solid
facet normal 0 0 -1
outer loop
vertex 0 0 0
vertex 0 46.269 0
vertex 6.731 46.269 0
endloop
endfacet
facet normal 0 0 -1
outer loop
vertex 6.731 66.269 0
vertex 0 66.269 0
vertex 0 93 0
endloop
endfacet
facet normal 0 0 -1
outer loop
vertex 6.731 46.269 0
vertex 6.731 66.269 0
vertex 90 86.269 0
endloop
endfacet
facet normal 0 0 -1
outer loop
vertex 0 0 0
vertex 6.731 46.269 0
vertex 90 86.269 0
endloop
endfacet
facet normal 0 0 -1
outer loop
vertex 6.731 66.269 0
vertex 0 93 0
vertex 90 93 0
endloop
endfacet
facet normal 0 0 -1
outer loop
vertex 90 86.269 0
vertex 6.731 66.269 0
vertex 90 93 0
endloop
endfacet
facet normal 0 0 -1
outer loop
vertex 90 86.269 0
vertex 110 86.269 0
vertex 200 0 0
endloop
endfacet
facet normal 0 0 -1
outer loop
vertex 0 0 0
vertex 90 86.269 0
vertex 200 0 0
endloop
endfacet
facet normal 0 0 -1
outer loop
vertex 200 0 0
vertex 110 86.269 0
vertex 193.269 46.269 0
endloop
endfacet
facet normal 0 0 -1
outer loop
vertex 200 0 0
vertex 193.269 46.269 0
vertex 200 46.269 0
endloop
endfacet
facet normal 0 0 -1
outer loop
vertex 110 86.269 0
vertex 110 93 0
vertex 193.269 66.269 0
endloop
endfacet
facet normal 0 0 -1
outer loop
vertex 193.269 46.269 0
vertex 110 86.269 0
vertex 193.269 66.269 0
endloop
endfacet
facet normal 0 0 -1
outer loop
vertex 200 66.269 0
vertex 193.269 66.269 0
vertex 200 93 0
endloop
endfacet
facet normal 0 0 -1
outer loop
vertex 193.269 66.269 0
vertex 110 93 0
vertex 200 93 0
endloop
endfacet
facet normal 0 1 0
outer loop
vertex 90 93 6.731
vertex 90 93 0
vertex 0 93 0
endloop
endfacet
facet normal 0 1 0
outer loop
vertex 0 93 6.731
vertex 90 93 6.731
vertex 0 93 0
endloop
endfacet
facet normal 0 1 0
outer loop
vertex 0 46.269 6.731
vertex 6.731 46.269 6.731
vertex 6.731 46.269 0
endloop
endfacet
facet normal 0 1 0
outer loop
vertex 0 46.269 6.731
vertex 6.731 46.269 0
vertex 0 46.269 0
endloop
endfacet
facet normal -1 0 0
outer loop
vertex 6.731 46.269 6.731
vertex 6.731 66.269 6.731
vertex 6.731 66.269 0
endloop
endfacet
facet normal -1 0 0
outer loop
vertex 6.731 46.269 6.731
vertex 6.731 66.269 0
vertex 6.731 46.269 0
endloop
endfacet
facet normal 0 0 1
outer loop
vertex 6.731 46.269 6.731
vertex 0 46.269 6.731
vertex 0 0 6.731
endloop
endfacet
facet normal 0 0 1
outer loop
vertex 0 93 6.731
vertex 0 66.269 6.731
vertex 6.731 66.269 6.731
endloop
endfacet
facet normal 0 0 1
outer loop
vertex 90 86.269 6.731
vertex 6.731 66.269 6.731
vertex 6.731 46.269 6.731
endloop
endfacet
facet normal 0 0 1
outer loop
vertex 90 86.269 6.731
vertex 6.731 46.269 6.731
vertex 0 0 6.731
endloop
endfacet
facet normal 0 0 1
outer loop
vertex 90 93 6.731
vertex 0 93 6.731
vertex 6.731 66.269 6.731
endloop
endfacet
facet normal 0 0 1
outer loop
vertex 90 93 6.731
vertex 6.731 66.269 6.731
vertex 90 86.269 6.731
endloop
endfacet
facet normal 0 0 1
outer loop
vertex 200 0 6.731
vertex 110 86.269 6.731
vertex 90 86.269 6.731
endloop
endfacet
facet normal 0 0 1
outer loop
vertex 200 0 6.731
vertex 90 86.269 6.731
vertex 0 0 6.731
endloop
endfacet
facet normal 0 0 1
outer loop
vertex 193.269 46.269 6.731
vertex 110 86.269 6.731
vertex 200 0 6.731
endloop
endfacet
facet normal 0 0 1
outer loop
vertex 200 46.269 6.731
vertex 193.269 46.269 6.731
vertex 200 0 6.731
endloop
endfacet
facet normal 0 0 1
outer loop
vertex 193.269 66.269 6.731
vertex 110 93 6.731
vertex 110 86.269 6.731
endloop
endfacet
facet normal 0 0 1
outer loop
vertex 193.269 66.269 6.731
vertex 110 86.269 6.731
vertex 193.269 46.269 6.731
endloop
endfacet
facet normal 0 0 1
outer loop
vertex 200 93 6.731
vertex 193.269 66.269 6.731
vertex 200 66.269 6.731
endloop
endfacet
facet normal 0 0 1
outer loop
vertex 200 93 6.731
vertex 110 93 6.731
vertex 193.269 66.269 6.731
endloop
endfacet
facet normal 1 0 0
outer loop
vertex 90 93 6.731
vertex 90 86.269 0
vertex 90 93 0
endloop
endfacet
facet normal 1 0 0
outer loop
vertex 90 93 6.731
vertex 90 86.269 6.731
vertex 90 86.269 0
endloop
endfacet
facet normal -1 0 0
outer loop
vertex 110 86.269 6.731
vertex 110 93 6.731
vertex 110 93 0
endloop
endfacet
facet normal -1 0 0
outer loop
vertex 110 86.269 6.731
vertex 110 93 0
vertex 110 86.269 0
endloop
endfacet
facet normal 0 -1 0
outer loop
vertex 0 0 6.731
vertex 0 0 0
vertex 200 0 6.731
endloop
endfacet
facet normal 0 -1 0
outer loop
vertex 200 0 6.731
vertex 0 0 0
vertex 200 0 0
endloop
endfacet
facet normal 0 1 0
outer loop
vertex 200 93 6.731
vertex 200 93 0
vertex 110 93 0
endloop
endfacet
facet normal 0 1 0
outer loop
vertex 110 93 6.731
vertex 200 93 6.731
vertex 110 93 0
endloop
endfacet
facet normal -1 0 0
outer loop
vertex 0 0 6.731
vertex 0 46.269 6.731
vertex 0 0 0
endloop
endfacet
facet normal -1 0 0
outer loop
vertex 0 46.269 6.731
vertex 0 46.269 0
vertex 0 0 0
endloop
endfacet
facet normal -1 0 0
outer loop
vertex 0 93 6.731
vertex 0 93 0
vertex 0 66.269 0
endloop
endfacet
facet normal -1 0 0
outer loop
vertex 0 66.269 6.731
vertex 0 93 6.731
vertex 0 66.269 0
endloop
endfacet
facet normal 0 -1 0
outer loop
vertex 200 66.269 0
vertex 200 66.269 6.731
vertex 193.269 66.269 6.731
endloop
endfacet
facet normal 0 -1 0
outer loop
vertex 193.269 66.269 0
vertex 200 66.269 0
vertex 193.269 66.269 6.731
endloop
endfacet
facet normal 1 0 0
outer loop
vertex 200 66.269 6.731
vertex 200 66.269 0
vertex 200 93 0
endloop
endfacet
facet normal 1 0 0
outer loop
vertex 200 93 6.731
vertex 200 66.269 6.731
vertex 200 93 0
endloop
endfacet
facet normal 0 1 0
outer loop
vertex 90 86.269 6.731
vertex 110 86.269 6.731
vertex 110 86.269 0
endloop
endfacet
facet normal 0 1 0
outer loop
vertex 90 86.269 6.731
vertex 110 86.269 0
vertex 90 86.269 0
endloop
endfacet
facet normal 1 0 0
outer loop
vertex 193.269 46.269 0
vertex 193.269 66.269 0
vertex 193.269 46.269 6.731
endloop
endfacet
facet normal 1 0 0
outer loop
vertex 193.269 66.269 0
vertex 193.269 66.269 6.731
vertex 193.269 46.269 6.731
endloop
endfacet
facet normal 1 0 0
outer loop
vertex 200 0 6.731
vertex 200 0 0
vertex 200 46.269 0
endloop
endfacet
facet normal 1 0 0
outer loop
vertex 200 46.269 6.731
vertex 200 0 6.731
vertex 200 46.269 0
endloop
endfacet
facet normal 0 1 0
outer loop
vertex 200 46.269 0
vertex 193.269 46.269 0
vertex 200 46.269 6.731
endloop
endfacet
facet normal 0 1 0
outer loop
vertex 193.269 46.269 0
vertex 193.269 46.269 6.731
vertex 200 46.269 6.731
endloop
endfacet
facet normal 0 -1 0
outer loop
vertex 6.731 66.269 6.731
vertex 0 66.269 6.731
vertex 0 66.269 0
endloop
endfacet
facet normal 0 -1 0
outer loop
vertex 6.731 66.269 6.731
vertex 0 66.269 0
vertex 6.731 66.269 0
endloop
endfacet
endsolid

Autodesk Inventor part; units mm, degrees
ref_plane "YZ Plane" through (0, 0, 0) normal (1, 0, 0) x (0, 1, 0)
ref_plane "XZ Plane" through (0, 0, 0) normal (0, 1, 0) x (-1, 0, 0)
ref_plane "XY Plane" through (0, 0, 0) normal (0, 0, 1) x (1, 0, 0)
sketch "Sketch1" plane through (0, 0, 0) normal (0, 0, 1) x (1, 0, 0)
  line L0 (0, 0) -> (200, 0)
  line L1 (200, 0) -> (200, 93)
  line L2 (200, 93) -> (0, 93)
  line L3 (0, 93) -> (0, 0)
  dimension "d0" = 93
  dimension "d1" = 200
extrude "Extrusion1" add sketch "Sketch1" along normal blind 6.731
sketch "Sketch2" plane through (0, 0, 6.731) normal (0, 0, 1) x (1, 0, 0)
  line L0 (200, 0) -> (200, 93) projected
  line L1 (200, 93) -> (0, 93) projected
  line L2 (0, 93) -> (0, 0) projected
  line L3 (90, 93) -> (110, 93)
  line L4 (110, 93) -> (110, 86.269)
  line L5 (110, 86.269) -> (90, 86.269)
  line L6 (90, 86.269) -> (90, 93)
  line L7 (0, 66.269) -> (6.731, 66.269)
  line L8 (6.731, 66.269) -> (6.731, 46.269)
  line L9 (6.731, 46.269) -> (0, 46.269)
  line L10 (0, 46.269) -> (0, 66.269)
  line L11 (200, 66.269) -> (193.269, 66.269)
  line L12 (193.269, 66.269) -> (193.269, 46.269)
  line L13 (193.269, 46.269) -> (200, 46.269)
  line L14 (200, 46.269) -> (200, 66.269)
  point P0 (100, 86.269)
  point P1 (100, 93)
  dimension "d5" = 20
  dimension "d6" = 6.731
  dimension "d9" = 20
extrude "Extrusion2" cut sketch "Sketch2" against normal blind 6.731
equation "\"d2\" = THICKB"
equation "\"d6\" = THICKB"
equation "\"d7\" = THICKB"
equation "\"THICKA\" = 3.175"
equation "\"THICKB\" = 6.731"
equation "\"THICKC\" = 12.7"
equation "\"THICKPLY\" = 5"
equation "\"MAGDIA\" = 9.5"
equation "\"BALLDIA\" = 12"
properties part number "Controller_Top"
